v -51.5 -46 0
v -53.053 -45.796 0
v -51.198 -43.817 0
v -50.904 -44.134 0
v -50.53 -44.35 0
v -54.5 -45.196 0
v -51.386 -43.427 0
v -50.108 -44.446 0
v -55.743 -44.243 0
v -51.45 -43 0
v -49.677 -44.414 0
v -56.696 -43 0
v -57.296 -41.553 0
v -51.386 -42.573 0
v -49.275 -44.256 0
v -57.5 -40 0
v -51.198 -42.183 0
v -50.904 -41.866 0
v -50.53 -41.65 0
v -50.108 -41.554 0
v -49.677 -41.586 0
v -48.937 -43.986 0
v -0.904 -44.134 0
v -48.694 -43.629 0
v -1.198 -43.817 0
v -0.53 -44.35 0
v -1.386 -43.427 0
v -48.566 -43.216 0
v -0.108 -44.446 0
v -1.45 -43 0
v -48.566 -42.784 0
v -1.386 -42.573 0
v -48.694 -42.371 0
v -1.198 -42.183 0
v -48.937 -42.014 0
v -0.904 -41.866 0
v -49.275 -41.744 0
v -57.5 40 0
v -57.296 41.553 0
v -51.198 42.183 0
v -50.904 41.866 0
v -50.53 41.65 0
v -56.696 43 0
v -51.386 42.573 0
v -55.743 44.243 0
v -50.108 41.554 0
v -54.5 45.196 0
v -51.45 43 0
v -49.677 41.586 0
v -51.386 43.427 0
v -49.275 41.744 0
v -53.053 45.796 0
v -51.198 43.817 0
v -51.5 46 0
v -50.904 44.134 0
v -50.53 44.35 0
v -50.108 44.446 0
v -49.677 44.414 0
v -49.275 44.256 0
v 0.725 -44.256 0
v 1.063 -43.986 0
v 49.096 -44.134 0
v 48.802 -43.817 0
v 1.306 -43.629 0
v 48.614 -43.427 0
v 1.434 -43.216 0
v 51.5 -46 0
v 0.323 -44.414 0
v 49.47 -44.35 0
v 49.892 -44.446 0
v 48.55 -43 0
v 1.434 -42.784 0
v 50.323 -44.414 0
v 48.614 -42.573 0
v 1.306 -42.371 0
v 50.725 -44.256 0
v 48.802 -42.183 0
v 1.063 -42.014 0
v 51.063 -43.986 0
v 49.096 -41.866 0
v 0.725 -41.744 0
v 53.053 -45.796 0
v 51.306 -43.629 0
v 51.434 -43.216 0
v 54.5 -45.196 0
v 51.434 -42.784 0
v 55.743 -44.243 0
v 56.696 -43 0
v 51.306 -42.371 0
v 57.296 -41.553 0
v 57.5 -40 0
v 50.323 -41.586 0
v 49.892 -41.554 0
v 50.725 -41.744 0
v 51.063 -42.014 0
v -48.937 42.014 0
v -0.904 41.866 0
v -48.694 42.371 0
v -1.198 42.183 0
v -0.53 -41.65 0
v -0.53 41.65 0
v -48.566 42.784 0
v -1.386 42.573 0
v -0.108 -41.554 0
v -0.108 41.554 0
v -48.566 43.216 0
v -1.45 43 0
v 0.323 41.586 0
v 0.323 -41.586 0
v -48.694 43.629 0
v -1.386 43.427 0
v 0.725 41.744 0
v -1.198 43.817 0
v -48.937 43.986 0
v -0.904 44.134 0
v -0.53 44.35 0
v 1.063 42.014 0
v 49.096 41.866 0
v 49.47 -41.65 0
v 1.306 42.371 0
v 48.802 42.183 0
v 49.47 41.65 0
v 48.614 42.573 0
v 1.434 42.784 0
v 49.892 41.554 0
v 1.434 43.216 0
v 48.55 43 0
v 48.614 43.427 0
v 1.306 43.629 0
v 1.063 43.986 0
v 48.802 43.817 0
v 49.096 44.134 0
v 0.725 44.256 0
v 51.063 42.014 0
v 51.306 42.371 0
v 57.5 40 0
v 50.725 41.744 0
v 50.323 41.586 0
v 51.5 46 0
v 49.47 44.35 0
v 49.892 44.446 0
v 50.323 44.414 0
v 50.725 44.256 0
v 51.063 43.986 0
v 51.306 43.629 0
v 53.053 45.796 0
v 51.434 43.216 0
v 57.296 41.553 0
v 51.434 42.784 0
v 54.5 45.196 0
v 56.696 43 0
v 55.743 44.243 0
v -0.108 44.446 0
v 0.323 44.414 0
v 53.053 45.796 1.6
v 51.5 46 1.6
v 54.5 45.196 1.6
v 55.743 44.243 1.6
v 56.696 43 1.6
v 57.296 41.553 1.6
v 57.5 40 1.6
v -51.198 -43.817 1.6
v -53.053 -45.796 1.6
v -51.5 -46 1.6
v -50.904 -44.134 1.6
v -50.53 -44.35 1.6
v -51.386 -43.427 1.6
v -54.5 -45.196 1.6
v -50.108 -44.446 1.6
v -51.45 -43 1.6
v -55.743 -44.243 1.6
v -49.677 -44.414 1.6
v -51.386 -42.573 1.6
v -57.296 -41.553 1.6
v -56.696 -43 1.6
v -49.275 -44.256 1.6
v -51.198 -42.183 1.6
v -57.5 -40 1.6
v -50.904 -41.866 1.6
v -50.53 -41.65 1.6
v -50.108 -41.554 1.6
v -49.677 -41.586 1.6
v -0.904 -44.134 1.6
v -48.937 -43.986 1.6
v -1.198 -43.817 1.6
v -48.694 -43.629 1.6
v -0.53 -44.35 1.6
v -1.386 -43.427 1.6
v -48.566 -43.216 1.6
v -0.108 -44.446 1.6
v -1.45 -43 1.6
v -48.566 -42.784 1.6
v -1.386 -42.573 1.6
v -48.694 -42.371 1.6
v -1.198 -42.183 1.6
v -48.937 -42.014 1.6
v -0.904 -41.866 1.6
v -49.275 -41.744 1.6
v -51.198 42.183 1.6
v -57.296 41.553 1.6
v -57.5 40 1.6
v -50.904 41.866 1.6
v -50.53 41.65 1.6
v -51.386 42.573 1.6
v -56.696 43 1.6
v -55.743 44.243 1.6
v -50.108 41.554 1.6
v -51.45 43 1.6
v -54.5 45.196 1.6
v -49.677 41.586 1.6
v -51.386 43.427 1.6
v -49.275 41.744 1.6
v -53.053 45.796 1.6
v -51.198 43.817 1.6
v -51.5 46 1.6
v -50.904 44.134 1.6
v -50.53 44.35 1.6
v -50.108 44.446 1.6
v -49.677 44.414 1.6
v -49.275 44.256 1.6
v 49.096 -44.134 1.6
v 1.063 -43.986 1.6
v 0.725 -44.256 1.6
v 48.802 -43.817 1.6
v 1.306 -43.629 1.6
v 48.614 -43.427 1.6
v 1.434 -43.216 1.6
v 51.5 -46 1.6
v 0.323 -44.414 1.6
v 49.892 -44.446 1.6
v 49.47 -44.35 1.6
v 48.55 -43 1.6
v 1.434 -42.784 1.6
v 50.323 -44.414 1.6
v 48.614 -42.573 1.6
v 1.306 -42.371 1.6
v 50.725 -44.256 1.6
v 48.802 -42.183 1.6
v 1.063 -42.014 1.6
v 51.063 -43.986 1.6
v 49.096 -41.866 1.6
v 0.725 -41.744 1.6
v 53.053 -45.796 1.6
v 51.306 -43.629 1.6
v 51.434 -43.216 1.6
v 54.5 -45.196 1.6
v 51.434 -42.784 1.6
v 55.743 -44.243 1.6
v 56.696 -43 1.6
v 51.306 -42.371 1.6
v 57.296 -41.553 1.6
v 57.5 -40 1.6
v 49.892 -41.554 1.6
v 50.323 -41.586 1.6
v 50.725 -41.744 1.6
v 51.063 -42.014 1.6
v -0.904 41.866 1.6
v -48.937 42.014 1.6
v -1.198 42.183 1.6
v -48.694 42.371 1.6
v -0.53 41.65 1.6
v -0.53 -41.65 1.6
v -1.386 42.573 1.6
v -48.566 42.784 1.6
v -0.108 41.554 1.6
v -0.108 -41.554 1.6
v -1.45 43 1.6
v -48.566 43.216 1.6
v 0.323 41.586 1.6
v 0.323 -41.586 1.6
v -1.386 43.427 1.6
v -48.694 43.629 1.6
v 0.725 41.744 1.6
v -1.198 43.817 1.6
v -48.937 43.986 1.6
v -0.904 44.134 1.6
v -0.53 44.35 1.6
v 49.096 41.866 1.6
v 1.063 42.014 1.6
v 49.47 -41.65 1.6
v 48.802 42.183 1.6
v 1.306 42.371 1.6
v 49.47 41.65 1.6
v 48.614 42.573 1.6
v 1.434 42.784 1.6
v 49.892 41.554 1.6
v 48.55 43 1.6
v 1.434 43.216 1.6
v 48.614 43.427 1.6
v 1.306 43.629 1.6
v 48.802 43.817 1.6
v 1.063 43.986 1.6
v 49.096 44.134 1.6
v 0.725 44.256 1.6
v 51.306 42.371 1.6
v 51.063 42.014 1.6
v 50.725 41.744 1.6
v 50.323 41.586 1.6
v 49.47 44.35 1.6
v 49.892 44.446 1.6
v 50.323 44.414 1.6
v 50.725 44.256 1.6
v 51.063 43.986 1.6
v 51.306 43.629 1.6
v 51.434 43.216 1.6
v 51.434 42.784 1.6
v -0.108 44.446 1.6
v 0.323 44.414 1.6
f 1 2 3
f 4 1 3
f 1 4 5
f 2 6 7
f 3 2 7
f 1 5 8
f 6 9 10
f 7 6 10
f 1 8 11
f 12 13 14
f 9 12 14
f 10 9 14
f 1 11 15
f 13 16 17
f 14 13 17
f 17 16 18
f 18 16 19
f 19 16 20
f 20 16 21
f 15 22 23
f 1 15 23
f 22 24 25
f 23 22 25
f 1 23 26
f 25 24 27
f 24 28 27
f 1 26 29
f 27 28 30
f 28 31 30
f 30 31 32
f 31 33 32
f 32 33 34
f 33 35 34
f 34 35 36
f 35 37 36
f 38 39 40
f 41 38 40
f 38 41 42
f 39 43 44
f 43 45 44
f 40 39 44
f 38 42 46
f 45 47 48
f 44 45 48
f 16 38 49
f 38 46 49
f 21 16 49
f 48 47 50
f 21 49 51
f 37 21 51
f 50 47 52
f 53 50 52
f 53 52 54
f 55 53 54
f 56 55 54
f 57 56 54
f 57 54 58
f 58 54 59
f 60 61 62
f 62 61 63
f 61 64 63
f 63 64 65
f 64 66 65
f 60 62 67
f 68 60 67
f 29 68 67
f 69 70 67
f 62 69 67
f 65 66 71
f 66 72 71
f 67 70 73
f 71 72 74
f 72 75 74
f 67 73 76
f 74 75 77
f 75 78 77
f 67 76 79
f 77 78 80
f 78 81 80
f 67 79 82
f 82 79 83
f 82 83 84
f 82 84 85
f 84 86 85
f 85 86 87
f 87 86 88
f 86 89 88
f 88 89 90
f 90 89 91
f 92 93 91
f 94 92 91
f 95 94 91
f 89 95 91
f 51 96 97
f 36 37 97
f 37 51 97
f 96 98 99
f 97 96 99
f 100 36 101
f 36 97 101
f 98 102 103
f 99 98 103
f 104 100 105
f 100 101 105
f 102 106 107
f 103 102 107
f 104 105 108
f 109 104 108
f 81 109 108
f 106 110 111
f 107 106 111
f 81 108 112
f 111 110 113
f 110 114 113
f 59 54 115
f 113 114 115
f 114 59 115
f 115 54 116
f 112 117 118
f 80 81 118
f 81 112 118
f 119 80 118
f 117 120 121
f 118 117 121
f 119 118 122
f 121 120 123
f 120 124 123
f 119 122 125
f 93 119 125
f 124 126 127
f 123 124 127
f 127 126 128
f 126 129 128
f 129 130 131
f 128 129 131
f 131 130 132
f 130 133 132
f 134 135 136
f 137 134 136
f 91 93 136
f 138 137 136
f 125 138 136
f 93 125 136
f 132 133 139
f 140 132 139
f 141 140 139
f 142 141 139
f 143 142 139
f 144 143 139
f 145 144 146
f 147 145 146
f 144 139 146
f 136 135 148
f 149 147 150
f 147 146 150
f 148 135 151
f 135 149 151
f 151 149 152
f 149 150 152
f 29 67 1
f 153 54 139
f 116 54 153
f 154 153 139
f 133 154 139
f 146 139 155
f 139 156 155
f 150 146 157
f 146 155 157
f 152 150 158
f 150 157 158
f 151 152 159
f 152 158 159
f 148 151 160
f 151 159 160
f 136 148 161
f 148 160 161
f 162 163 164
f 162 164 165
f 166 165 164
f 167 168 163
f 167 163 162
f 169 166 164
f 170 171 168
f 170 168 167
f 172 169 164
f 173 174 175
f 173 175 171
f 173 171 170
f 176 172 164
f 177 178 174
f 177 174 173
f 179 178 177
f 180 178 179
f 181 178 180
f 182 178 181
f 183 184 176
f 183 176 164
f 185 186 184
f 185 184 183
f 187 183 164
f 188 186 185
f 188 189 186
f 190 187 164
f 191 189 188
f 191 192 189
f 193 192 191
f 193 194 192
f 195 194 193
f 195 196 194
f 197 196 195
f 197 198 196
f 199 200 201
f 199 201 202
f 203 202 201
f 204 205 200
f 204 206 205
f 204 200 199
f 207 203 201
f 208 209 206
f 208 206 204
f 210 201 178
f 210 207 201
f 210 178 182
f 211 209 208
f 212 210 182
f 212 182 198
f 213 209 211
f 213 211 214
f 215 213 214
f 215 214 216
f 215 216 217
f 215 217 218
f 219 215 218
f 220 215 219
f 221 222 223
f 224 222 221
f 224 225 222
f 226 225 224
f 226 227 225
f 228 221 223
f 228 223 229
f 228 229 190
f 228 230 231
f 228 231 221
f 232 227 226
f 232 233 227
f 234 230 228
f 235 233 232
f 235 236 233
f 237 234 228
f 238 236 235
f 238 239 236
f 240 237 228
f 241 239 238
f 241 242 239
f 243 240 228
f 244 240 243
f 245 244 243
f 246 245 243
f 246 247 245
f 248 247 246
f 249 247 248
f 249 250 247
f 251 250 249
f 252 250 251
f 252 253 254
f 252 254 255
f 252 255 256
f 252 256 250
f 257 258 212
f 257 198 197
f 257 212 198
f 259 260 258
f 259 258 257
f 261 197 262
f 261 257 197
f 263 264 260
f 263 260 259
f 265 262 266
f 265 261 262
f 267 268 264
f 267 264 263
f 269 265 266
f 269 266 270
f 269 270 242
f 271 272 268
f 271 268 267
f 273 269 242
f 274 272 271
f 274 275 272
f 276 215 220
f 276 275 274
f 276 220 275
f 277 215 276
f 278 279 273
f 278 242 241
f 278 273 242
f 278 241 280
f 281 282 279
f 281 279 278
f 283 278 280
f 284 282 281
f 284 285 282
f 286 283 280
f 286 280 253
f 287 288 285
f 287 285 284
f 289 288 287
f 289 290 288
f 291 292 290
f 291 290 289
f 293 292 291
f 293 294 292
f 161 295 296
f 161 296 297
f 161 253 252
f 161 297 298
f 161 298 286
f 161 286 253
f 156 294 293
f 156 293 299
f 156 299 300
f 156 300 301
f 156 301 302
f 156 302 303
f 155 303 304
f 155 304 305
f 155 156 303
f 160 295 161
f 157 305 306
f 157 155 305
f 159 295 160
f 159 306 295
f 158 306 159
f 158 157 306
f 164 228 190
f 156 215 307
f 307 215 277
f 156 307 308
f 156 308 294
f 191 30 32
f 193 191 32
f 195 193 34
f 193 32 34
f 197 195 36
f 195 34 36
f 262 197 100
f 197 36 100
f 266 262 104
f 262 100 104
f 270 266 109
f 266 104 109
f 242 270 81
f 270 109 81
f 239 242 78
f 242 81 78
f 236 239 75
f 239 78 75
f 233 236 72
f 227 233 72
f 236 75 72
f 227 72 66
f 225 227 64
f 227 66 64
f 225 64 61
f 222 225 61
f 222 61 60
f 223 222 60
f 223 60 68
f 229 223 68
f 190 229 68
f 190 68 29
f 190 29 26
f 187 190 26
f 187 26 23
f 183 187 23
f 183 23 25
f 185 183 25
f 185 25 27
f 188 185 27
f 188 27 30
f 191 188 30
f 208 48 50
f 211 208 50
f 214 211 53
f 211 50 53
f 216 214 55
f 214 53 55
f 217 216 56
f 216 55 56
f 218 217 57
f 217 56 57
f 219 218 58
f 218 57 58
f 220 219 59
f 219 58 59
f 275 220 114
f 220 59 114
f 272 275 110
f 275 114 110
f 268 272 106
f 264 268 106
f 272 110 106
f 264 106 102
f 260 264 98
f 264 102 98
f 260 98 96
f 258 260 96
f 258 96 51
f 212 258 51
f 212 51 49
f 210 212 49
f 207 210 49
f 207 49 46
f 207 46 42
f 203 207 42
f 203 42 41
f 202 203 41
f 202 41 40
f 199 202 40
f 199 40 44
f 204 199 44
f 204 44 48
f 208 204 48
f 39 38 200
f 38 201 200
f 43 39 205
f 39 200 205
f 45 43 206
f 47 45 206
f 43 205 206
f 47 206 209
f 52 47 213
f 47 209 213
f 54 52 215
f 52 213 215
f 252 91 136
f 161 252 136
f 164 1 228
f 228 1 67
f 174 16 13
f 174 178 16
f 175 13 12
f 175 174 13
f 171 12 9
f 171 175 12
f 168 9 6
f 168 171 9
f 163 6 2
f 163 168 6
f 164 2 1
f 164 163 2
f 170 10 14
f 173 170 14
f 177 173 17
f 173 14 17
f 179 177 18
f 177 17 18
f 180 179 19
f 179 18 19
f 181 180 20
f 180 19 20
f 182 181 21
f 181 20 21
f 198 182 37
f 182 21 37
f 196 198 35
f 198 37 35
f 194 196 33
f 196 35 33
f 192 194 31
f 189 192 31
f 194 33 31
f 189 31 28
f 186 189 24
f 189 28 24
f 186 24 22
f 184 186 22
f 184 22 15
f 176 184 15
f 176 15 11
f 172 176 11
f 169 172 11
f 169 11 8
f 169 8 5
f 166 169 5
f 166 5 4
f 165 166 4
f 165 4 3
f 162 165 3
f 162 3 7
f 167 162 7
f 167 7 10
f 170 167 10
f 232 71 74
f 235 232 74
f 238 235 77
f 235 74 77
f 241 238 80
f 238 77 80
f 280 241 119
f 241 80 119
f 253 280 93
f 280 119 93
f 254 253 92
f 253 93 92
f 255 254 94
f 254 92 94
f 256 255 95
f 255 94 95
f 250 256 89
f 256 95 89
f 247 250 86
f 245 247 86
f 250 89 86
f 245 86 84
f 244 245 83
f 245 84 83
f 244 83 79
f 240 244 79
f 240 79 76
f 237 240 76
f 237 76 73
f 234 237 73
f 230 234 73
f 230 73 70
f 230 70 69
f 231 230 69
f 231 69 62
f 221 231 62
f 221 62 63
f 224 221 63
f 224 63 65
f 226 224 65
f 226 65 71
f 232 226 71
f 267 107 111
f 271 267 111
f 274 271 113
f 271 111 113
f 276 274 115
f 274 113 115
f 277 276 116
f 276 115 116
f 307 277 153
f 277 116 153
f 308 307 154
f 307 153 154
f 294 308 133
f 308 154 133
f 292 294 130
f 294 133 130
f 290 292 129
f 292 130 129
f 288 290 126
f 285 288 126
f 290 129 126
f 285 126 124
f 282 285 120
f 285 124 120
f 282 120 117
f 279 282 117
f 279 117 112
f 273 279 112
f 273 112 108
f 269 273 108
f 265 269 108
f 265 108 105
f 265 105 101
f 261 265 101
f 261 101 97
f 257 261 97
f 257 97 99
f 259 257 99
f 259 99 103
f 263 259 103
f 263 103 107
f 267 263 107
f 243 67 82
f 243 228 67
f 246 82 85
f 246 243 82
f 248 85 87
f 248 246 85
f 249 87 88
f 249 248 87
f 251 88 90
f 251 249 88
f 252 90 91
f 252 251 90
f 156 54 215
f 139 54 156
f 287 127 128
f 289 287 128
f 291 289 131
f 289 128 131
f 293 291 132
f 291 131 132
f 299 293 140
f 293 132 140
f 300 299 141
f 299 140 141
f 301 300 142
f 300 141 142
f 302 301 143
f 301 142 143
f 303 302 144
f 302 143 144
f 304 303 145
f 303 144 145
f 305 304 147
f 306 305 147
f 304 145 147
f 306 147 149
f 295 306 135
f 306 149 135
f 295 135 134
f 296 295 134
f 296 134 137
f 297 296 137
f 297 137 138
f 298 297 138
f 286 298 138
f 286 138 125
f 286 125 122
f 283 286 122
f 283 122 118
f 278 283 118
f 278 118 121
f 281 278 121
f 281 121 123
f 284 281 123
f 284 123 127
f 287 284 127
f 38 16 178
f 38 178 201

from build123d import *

# Parameters (mm, degrees)
SKETCH1_W              = 115
SKETCH1_H              = 92
BOSS_EXTRUDE1_DEPTH    = 1.6002
M2_5_CLEARANCE_HOLE1_D = 2.9
FILLET2_R              = 6


with BuildPart() as part:
    # Sketch1 → Boss-Extrude1 (new body)
    with BuildSketch(Plane.XY):
        Rectangle(SKETCH1_W, SKETCH1_H)
    extrude(amount=BOSS_EXTRUDE1_DEPTH)

    # M2.5 Clearance Hole1 (through all)
    with Locations(Plane.XY.offset(1.6002)):
        with Locations((50, -43), (-50, 43), (-50, -43), (50, 43), (0, 43), (0, -43)):
            Hole(M2_5_CLEARANCE_HOLE1_D / 2)

    # Fillet2
    fillet2_edges = [part.edges().sort_by_distance(p)[0] for p in [
        (57.5, -46, 0.8001),
        (-57.5, -46, 0.8001),
        (-57.5, 46, 0.8001),
        (57.5, 46, 0.8001),
    ]]
    fillet(fillet2_edges, radius=FILLET2_R)


solid = part.part
